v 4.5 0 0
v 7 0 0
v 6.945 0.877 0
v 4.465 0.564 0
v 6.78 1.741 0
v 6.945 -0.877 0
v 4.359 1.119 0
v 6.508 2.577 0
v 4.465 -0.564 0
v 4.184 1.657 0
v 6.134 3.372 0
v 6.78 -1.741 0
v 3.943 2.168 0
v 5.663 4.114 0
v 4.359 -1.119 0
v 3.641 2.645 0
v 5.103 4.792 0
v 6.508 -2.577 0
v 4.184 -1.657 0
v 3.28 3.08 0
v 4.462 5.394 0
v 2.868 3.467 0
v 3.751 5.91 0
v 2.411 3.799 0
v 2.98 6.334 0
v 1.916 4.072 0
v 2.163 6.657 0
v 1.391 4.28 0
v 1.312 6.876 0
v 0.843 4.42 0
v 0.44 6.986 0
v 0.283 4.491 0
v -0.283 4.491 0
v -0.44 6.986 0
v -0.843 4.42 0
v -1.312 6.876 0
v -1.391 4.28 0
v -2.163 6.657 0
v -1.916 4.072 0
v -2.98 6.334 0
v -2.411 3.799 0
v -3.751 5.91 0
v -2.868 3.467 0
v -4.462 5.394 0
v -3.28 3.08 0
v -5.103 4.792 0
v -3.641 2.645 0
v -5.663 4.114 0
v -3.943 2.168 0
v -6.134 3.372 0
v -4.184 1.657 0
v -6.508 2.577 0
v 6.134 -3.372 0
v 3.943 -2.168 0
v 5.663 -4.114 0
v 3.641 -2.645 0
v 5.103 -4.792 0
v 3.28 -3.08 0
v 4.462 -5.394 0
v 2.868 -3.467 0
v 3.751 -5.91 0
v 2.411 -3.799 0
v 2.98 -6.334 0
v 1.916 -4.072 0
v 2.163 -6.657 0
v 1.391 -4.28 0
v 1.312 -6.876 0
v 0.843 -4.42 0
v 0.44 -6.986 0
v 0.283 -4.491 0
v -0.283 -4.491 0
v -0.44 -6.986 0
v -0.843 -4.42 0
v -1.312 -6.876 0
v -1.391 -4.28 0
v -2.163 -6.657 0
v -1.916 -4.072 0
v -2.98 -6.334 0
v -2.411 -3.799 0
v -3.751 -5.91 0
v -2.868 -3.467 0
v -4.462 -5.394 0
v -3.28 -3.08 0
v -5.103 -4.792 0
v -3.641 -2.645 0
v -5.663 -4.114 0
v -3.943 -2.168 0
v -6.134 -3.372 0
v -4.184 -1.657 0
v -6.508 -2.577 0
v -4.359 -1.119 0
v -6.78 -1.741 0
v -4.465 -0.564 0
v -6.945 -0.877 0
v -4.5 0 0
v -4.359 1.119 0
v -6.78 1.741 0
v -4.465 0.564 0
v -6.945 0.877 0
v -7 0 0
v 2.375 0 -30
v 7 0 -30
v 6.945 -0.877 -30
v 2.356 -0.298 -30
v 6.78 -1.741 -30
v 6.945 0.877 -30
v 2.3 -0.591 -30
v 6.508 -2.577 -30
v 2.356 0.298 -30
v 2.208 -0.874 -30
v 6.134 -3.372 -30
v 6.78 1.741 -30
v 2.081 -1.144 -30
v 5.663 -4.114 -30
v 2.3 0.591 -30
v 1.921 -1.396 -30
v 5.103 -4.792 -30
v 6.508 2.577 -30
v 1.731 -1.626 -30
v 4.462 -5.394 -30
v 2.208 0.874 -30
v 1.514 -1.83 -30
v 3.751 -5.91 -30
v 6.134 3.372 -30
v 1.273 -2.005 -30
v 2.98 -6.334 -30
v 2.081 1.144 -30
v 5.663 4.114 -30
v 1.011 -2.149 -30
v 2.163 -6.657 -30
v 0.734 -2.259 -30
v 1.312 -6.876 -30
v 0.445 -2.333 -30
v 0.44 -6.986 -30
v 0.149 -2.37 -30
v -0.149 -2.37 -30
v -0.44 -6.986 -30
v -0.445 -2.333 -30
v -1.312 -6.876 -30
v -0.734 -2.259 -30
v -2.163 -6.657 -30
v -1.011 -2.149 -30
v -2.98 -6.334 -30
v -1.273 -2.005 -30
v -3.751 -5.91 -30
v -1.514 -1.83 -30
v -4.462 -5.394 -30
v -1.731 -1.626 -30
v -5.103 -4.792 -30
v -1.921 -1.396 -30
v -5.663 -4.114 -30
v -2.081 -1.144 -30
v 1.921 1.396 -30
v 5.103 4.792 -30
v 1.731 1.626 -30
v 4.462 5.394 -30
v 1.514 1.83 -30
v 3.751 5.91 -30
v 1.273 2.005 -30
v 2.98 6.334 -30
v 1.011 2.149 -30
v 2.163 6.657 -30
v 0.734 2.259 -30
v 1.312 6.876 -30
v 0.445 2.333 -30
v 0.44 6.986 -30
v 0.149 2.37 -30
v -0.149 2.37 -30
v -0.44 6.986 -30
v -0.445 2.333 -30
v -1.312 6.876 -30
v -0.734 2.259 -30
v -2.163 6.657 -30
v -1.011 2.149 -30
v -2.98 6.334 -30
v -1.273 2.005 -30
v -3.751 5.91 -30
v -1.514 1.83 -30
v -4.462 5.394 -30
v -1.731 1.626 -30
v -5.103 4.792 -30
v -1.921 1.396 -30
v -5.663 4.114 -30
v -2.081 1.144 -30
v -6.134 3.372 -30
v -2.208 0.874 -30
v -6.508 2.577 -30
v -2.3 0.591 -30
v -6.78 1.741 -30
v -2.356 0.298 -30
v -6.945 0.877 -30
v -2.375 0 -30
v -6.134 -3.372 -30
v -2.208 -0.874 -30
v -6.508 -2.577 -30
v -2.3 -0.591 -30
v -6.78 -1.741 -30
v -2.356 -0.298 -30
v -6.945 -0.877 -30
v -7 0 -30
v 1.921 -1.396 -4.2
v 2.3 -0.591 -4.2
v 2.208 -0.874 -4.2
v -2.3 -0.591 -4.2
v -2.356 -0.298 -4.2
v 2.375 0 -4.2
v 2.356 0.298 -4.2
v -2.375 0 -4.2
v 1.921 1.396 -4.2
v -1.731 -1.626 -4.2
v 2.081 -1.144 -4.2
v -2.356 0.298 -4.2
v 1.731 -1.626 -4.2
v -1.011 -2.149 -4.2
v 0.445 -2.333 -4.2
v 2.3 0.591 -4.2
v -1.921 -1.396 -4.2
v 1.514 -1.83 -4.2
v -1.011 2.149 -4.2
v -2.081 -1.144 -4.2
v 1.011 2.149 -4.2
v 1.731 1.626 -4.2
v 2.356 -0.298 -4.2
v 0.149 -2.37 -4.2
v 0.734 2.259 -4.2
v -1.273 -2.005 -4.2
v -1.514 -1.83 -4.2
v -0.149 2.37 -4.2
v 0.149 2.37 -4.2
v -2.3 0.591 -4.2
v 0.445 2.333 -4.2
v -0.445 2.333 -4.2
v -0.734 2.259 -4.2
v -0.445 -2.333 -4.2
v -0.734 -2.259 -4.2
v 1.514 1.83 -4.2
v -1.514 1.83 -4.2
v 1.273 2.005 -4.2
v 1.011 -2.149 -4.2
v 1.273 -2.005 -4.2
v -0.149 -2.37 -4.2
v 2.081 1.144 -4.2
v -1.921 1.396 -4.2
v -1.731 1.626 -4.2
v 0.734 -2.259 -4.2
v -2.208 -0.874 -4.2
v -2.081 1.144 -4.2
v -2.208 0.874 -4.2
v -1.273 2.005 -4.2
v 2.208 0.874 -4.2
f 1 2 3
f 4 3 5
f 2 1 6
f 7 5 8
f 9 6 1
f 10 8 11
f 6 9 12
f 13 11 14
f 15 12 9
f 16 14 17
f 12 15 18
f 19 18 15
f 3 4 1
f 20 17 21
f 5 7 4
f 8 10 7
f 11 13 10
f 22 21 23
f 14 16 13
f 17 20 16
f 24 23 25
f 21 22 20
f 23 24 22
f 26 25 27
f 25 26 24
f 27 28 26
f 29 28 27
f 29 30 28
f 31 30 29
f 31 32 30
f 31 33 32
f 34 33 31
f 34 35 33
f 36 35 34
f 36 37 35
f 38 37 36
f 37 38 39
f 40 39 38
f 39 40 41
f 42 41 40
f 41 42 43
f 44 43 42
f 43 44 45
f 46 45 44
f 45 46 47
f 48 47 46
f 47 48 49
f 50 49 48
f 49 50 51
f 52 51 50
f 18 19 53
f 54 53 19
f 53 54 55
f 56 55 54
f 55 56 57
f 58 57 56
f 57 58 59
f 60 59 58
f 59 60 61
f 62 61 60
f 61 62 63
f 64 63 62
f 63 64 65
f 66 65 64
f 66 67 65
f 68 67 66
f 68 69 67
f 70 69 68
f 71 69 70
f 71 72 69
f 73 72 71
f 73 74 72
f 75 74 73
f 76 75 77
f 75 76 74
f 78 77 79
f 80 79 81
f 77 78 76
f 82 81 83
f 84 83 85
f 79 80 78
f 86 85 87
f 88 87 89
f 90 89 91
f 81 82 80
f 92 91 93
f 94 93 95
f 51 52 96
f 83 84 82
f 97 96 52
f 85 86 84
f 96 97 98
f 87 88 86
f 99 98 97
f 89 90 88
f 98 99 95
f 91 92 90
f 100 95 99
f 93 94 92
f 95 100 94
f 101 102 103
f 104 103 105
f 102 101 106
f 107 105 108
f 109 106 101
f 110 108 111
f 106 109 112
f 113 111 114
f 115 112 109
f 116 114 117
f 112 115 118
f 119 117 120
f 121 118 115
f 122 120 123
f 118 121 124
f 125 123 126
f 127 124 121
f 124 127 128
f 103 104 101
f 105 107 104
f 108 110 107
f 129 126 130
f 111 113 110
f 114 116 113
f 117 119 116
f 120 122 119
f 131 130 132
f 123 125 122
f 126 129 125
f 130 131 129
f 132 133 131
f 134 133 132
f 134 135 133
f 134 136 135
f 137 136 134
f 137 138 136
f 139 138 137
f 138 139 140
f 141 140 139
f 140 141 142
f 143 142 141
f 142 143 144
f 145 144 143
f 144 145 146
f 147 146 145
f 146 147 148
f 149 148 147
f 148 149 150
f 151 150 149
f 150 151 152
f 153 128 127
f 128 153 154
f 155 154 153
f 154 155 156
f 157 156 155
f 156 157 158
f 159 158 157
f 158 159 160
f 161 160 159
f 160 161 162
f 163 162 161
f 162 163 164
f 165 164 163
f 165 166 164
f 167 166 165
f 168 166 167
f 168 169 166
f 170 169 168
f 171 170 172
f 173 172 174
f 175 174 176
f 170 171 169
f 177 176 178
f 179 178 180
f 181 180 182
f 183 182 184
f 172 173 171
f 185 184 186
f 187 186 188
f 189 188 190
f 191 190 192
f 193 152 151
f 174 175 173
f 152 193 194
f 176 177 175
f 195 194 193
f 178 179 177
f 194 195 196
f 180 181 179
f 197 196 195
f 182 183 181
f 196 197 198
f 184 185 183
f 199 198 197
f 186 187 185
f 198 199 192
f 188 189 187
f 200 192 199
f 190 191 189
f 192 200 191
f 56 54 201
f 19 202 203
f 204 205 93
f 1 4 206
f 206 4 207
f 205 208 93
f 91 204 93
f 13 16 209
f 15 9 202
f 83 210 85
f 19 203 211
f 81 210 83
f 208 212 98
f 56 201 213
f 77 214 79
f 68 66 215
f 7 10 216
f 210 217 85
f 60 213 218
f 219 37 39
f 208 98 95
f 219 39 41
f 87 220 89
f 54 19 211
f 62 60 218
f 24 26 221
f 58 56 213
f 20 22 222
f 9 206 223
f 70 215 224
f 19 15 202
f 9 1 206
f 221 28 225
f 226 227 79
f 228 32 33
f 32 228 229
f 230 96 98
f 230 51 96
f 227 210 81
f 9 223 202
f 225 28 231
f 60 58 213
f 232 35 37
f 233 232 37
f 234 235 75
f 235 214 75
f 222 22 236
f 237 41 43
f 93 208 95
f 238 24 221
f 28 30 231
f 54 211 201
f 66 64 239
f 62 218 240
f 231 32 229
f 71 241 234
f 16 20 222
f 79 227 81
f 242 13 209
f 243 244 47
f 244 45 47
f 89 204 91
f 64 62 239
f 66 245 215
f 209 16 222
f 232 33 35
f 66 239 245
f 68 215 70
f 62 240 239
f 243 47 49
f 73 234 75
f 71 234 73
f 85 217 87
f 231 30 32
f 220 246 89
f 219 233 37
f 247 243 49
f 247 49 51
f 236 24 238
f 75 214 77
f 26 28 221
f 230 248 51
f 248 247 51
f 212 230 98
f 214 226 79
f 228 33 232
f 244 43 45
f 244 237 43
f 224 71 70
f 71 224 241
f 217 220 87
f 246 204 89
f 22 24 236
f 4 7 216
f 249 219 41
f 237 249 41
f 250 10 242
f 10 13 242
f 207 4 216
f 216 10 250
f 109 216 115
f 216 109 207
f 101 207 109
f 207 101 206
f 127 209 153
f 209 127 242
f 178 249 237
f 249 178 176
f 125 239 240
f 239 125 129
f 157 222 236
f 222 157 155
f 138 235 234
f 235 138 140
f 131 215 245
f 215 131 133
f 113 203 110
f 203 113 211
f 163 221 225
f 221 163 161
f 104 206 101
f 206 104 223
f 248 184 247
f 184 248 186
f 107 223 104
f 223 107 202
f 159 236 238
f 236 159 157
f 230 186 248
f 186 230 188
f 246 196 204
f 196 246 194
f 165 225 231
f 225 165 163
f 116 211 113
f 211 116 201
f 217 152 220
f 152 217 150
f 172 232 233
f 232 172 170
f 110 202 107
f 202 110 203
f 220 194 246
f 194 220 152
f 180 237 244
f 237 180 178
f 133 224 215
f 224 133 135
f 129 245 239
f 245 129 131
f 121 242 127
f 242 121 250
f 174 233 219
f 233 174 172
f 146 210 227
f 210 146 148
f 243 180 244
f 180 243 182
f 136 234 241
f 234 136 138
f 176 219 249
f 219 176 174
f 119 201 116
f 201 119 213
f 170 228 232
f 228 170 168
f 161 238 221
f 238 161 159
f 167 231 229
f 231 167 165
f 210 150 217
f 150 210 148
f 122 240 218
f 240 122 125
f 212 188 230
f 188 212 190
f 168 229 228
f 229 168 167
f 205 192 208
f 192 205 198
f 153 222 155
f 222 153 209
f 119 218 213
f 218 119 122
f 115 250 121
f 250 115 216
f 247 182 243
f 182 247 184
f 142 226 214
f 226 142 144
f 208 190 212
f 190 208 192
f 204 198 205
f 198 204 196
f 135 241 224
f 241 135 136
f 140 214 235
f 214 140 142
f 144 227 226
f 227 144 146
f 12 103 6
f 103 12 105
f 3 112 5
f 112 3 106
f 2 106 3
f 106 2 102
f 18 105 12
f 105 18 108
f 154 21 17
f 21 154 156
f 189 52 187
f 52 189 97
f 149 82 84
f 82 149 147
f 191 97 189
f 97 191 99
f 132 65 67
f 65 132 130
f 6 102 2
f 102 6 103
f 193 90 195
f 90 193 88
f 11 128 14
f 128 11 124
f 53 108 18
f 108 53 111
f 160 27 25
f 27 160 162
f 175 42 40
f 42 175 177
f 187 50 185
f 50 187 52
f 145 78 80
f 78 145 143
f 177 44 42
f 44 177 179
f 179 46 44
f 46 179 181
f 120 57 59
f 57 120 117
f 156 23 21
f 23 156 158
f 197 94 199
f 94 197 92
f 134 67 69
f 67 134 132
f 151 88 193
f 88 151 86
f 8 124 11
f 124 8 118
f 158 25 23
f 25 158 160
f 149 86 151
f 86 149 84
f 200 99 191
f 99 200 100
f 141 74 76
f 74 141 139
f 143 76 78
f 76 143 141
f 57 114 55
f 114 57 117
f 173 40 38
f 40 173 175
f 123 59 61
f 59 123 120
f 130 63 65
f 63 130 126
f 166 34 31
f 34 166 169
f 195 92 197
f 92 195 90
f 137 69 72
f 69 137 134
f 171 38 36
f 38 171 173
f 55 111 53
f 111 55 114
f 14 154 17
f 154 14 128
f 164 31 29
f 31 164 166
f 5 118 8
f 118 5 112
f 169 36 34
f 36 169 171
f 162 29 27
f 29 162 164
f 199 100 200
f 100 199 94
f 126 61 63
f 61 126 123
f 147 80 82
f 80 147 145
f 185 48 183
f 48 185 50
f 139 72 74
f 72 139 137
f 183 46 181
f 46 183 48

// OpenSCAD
$fn = 50;


difference() {
	union() {
		translate(v = [0, 0, -30.0000000000]) {
			cylinder(h = 30, r = 7.0000000000);
		}
		cylinder(h = 0, r = 13.0000000000);
	}
	union() {
		translate(v = [0, 0, 0]) {
			rotate(a = [0, 0, 0]) {
				difference() {
					union() {
						#translate(v = [0, 0, -30.0000000000]) {
							cylinder(h = 30, r = 2.2500000000);
						}
						#translate(v = [0, 0, -4.2000000000]) {
							cylinder(h = 4.2000000000, r = 7.0000000000, r1 = 2.3750000000, r2 = 4.5000000000);
						}
						#translate(v = [0, 0, -30.0000000000]) {
							cylinder(h = 30, r = 2.3750000000);
						}
						#translate(v = [0, 0, -30.0000000000]) {
							cylinder(h = 30, r = 2.2500000000);
						}
					}
					union();
				}
			}
		}
	}
}
